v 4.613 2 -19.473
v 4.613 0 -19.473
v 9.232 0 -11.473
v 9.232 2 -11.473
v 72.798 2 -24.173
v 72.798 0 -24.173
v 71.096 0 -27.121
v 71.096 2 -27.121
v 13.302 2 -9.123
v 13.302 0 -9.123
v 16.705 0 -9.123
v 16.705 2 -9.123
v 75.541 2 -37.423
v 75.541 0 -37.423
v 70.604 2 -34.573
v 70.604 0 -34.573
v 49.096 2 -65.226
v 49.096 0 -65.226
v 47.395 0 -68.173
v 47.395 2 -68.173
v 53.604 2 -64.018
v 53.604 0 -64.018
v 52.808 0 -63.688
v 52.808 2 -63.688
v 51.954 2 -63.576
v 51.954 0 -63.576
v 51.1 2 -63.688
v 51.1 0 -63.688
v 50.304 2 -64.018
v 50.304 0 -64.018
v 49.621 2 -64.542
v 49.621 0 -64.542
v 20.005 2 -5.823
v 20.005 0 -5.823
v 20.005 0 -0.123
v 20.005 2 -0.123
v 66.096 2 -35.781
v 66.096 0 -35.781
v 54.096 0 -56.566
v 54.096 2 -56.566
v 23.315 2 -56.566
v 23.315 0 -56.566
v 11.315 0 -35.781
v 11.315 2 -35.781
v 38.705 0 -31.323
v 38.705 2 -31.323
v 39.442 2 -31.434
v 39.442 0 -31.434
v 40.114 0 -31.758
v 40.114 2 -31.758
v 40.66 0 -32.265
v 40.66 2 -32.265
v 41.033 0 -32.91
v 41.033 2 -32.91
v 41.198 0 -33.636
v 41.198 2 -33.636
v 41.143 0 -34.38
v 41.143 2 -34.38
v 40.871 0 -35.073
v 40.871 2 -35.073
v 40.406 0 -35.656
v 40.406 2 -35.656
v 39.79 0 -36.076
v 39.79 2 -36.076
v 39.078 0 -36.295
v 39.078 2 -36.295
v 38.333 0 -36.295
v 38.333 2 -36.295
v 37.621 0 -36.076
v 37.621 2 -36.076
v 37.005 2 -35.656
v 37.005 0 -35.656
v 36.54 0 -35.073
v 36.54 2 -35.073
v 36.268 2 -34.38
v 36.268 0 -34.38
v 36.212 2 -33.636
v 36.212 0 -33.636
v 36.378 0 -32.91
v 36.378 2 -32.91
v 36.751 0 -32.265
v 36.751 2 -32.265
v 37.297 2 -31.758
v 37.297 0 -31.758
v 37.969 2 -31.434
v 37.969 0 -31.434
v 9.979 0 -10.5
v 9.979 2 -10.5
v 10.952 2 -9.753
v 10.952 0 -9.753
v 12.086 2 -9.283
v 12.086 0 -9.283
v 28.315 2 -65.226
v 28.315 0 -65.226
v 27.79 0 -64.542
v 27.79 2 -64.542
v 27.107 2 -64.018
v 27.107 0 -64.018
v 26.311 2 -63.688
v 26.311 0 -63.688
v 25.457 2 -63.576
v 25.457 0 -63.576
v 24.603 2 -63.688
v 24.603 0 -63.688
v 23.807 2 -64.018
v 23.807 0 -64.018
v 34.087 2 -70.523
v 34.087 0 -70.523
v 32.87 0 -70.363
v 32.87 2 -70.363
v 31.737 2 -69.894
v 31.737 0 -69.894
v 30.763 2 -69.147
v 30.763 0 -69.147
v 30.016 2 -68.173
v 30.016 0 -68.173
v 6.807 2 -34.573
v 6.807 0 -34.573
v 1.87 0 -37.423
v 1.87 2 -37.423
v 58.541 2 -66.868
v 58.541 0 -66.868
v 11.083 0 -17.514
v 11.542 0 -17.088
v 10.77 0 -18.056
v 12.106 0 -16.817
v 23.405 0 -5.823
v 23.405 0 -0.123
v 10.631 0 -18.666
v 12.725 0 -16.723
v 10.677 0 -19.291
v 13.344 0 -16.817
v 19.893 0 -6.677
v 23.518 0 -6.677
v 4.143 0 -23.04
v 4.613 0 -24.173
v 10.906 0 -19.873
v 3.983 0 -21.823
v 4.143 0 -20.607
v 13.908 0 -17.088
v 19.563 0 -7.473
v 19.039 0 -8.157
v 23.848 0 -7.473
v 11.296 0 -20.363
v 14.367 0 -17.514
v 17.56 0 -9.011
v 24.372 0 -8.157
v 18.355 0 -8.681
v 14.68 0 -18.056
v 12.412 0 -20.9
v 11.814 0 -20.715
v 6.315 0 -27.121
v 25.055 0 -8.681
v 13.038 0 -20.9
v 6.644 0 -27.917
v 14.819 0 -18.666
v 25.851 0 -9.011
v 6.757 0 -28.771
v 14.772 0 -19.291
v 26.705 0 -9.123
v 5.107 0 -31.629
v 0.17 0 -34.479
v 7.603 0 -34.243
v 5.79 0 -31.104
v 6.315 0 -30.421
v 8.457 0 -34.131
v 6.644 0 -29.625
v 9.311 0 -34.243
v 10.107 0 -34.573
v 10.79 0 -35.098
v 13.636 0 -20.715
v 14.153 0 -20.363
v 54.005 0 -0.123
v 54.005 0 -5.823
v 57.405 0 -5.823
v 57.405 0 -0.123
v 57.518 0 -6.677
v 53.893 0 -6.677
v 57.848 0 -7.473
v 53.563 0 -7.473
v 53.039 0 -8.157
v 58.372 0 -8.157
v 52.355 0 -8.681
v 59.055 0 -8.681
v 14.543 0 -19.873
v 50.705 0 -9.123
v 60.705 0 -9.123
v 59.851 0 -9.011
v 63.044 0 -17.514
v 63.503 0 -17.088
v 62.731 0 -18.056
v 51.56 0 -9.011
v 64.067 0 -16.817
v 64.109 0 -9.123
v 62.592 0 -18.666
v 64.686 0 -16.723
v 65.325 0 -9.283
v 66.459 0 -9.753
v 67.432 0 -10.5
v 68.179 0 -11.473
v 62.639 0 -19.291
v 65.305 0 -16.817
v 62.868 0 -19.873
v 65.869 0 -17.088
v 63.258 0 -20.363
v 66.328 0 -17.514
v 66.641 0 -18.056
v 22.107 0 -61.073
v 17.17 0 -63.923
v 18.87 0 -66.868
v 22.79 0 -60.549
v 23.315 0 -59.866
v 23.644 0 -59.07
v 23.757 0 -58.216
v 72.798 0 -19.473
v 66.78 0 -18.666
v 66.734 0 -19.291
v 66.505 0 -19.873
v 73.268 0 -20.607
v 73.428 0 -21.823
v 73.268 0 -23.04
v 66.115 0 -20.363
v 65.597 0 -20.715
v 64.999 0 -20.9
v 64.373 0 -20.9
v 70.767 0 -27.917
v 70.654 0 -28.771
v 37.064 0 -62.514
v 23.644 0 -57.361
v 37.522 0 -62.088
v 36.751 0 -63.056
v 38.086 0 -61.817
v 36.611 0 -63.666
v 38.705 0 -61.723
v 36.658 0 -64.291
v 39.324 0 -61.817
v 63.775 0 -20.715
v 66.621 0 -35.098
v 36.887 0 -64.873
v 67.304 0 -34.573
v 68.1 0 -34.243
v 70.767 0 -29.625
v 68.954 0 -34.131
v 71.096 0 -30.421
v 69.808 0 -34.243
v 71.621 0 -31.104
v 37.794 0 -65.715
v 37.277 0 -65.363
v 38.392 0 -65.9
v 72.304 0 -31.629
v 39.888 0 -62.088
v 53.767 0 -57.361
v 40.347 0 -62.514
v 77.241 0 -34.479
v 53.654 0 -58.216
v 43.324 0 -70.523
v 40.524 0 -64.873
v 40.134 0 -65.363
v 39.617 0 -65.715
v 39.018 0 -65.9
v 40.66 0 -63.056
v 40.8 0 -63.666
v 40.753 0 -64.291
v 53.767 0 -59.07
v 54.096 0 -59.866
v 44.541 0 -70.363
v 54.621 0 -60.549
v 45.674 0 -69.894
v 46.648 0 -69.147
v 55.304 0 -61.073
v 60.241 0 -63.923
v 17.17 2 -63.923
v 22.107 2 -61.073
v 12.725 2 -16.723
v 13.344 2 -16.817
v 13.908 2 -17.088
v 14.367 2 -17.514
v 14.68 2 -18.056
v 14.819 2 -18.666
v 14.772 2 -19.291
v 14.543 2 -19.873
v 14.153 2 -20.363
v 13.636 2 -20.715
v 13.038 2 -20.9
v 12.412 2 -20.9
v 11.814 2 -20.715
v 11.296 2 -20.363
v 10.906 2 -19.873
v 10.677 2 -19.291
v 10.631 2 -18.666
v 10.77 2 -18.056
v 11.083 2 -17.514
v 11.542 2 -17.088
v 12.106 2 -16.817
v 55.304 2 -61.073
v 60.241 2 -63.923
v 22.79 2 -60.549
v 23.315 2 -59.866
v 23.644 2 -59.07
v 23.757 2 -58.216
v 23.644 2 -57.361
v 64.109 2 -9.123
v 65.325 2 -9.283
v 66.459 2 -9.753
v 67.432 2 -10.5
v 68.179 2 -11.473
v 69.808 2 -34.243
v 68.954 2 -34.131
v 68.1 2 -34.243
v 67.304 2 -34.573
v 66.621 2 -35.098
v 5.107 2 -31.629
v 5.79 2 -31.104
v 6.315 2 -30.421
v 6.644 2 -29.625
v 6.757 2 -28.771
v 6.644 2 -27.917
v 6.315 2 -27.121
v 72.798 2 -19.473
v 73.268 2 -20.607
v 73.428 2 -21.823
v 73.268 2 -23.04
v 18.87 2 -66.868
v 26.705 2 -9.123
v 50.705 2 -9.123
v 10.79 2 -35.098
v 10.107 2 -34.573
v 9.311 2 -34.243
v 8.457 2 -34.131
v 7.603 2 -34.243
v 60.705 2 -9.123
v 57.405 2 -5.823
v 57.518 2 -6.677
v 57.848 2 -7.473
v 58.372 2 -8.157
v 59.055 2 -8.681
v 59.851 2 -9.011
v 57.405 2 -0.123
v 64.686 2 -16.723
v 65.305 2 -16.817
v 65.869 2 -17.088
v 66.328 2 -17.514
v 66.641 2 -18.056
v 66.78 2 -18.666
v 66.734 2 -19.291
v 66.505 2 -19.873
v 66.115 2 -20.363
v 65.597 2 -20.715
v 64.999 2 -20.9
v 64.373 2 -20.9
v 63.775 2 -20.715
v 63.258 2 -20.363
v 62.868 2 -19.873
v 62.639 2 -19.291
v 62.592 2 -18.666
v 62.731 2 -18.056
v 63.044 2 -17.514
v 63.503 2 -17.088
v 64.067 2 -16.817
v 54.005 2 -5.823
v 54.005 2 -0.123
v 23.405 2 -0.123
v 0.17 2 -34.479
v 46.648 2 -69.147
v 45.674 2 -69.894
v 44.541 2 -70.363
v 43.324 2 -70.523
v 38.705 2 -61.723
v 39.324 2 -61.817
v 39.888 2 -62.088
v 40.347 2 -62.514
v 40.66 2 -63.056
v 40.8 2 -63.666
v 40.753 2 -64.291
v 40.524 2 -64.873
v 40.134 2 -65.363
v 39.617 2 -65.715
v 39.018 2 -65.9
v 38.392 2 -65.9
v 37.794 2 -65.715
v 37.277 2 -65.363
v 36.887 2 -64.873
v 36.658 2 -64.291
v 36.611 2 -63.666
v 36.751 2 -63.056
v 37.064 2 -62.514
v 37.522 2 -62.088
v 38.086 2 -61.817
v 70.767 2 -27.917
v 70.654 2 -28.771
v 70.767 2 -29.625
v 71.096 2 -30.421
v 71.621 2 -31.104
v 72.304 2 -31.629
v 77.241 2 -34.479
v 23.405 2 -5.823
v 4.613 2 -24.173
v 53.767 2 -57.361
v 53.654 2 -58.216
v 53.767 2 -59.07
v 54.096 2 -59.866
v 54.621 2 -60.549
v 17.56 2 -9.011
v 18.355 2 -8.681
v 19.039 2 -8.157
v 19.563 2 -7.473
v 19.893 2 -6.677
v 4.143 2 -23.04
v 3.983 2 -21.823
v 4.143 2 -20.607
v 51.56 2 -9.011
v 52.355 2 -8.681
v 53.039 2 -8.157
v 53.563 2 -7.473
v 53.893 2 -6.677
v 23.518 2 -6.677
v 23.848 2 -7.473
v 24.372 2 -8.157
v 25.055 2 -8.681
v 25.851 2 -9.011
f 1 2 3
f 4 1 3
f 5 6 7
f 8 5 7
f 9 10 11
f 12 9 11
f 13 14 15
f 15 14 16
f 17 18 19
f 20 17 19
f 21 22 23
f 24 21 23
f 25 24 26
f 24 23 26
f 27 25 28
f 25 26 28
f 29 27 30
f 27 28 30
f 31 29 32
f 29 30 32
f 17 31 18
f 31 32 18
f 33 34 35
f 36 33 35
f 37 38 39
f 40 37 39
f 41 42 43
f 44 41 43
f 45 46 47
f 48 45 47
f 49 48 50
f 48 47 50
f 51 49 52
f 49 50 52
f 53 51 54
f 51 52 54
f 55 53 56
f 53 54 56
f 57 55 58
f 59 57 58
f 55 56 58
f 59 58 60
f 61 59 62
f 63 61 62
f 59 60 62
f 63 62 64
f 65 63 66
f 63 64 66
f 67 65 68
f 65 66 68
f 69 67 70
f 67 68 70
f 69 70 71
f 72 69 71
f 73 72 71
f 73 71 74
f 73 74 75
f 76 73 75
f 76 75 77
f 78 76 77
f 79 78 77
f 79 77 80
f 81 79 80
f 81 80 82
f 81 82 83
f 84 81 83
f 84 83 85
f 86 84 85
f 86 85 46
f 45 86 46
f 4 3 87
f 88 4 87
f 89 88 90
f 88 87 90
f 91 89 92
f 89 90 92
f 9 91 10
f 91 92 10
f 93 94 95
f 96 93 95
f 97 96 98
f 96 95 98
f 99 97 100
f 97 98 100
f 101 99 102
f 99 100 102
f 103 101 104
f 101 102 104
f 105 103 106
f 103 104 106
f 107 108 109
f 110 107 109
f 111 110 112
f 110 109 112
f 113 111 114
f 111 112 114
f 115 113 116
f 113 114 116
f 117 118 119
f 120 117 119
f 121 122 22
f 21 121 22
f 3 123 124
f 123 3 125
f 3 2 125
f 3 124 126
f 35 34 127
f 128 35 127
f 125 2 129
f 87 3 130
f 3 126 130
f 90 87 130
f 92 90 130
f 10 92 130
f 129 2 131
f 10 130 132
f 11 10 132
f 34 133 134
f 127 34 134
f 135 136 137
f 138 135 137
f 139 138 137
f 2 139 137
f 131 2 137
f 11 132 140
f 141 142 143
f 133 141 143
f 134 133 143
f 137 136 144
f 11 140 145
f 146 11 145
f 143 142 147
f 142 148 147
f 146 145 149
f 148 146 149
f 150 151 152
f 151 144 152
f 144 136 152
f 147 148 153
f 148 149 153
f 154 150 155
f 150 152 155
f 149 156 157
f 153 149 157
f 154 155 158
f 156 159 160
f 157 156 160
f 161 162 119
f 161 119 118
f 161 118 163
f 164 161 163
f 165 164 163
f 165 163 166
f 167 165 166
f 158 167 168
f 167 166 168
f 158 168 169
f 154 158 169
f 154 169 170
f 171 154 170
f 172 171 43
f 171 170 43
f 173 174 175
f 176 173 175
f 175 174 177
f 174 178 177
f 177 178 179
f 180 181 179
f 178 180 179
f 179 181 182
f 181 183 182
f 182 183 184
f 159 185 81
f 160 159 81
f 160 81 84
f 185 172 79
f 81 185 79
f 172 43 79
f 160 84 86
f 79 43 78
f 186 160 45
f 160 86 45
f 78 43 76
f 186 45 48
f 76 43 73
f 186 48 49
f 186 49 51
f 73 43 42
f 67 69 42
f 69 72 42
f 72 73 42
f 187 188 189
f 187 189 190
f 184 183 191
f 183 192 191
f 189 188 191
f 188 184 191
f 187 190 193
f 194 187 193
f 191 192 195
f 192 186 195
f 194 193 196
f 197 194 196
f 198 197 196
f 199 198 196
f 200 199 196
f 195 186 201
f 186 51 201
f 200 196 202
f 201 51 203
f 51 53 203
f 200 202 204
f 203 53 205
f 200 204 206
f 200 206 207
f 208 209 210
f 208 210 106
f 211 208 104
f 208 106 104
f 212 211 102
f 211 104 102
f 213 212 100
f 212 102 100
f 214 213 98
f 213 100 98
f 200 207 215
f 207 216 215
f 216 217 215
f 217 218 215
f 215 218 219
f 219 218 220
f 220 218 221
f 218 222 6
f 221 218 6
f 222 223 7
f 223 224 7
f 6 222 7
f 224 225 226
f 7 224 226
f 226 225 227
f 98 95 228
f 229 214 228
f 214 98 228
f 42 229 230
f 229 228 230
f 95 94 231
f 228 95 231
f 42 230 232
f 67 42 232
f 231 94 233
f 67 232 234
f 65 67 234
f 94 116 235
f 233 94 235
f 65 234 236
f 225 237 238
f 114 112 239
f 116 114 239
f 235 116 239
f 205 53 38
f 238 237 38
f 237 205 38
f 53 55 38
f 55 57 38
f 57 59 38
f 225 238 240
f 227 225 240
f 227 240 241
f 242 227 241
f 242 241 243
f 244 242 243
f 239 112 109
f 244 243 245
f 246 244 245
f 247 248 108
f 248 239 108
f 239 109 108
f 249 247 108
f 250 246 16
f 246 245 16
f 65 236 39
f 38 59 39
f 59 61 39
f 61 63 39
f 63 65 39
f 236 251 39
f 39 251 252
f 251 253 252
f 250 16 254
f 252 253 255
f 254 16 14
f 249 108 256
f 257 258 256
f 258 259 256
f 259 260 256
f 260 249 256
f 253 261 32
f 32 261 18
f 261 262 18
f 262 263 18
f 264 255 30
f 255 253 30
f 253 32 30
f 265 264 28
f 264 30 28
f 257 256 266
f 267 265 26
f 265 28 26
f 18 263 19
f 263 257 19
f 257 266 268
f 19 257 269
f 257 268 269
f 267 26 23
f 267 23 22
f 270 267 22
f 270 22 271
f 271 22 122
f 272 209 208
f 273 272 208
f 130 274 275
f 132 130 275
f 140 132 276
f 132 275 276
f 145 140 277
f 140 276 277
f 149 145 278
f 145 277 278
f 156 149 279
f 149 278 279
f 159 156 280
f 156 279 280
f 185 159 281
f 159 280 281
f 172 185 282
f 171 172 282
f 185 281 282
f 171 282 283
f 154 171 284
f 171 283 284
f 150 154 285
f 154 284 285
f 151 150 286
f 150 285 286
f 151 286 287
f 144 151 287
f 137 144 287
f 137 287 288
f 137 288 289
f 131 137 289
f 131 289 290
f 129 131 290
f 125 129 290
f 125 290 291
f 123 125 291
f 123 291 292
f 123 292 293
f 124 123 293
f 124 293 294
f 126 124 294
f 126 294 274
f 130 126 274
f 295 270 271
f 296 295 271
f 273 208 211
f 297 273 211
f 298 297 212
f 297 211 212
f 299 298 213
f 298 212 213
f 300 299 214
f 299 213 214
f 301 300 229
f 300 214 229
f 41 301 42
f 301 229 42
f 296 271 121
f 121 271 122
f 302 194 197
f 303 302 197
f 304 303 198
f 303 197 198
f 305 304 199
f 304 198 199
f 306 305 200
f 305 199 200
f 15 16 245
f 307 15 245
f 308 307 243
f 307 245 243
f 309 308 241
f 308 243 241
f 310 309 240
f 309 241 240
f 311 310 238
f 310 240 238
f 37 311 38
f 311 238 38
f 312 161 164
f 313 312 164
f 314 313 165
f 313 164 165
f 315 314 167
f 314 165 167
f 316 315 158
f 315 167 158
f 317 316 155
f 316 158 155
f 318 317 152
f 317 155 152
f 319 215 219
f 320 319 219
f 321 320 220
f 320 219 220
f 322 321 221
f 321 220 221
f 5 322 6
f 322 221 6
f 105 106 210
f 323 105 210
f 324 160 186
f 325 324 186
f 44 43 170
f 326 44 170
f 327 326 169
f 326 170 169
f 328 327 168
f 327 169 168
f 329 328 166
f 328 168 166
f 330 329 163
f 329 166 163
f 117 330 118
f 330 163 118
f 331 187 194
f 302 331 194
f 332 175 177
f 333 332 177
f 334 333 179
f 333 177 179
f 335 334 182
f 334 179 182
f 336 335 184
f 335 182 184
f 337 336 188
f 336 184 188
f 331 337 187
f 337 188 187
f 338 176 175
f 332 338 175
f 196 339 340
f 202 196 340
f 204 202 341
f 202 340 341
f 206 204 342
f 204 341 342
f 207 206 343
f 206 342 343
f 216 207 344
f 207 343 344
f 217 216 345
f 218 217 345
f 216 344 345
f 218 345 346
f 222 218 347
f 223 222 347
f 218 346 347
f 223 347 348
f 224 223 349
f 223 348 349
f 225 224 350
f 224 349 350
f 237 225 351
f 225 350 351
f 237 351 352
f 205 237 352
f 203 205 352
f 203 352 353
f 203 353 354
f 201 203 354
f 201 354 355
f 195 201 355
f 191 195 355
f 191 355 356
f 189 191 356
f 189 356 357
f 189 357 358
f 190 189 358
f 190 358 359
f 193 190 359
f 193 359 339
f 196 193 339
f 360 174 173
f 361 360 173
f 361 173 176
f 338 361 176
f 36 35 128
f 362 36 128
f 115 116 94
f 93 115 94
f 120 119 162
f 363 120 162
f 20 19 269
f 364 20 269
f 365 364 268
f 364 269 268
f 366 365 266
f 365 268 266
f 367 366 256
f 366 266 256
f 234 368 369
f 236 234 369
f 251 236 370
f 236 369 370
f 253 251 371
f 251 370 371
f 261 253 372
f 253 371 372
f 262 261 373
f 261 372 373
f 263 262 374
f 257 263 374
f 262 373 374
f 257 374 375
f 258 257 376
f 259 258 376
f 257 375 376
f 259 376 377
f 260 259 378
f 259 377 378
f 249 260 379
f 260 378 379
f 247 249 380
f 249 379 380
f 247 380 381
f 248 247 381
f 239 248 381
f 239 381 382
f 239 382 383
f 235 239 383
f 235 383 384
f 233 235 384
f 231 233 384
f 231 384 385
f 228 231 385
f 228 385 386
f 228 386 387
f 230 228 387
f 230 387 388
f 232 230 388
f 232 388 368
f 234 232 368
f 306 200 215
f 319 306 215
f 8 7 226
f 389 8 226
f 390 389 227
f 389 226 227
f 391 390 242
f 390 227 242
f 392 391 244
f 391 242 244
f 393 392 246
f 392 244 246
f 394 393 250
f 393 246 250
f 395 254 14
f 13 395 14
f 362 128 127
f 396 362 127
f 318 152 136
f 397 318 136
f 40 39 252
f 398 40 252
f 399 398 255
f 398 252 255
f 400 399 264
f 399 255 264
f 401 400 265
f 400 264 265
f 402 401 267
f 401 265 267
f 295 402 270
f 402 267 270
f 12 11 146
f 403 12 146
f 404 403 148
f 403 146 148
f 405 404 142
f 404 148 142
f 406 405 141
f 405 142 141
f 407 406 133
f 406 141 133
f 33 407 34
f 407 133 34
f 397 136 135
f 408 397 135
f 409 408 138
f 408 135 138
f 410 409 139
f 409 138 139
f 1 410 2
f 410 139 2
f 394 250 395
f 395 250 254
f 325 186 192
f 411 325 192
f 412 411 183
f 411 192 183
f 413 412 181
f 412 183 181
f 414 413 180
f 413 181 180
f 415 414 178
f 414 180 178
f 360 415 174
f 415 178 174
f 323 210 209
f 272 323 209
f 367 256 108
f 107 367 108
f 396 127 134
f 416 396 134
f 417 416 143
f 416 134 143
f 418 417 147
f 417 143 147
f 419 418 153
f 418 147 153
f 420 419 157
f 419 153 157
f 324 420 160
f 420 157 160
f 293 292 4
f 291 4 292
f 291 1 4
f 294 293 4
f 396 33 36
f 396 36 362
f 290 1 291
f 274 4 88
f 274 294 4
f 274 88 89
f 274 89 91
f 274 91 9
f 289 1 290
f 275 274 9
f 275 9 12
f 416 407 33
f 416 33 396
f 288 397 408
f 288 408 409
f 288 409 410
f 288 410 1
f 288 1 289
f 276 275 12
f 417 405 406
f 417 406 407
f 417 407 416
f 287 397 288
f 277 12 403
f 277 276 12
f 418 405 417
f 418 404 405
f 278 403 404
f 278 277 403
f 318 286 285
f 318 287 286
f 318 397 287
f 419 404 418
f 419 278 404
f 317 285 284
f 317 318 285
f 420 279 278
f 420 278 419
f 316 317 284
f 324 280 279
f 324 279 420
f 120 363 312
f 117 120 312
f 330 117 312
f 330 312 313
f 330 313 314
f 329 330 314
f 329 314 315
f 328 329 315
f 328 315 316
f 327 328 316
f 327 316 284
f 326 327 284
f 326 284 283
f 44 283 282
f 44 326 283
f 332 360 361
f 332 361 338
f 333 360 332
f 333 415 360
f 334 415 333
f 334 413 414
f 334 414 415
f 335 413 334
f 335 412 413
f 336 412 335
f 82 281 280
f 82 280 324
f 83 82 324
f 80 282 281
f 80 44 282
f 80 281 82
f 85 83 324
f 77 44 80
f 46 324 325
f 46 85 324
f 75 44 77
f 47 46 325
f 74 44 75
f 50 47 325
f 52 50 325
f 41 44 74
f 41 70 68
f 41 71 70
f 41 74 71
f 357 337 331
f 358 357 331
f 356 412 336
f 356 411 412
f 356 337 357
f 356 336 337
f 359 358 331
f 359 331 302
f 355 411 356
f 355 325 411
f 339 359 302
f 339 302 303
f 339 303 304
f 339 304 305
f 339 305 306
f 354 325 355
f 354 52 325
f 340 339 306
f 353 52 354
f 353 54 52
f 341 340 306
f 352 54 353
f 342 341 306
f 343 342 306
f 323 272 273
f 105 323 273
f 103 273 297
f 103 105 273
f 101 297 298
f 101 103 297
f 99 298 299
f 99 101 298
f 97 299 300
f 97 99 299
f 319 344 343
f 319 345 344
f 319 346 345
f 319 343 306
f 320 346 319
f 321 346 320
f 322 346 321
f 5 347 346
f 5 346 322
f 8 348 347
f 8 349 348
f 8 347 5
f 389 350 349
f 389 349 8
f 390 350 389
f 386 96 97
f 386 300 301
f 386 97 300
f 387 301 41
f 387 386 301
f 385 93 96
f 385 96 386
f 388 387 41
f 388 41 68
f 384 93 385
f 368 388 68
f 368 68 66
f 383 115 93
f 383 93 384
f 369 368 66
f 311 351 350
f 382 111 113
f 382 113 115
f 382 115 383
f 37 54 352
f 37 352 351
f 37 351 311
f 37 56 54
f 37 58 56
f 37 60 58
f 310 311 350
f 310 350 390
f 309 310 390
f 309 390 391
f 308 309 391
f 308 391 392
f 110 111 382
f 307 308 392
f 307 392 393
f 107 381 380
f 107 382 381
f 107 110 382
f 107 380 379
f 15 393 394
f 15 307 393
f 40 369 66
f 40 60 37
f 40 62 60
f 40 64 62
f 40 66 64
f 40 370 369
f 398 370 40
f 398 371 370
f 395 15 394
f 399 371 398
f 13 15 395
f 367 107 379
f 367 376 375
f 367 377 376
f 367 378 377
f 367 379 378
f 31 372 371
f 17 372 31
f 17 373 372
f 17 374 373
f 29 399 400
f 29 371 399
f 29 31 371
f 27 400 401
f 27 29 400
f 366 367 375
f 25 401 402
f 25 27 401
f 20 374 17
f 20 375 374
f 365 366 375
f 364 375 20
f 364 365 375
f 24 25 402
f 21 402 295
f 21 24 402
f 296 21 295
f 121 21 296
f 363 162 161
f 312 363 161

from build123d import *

# Parameters (mm, degrees)
BOSS_EXTRUDE1_DEPTH = 2
SKETCH4_R           = 2.1
CUT_EXTRUDE1_DEPTH  = 105.611811864
SKETCH5_R           = 2.5
CUT_EXTRUDE2_DEPTH  = 105.611811864


with BuildPart() as part:
    # Sketch1 → Boss-Extrude1 (new body)
    with BuildSketch(Plane(origin=(0, 0, 0), x_dir=(1, 0, 0), z_dir=(0, 1, 0))):
        with BuildLine():
            Line((49.096295698, 65.225835767), (47.394589776, 68.173276884))
            ThreePointArc((47.394589776, 68.173276884), (45.674270378, 69.893596282), (43.324270378, 70.523276884))
            Line((43.324270378, 70.523276884), (34.086666071, 70.523276884))
            ThreePointArc((34.086666071, 70.523276884), (31.736666071, 69.893596282), (30.016346673, 68.173276884))
            Line((30.016346673, 68.173276884), (28.314640751, 65.225835767))
            ThreePointArc((28.314640751, 65.225835767), (26.310859767, 63.688280541), (23.806756919, 64.017951935))
            Line((23.806756919, 64.017951935), (18.870412117, 66.867951935))
            Line((18.870412117, 66.867951935), (17.170412117, 63.923465562))
            Line((17.170412117, 63.923465562), (22.106756919, 61.073465562))
            ThreePointArc((22.106756919, 61.073465562), (23.644312145, 59.069684578), (23.314640751, 56.565581729))
            Line((23.314640751, 56.565581729), (11.314640751, 35.780972039))
            ThreePointArc((11.314640751, 35.780972039), (9.310859767, 34.243416812), (6.806756919, 34.573088206))
            Line((6.806756919, 34.573088206), (1.870412117, 37.423088206))
            Line((1.870412117, 37.423088206), (0.170412117, 34.478601833))
            Line((0.170412117, 34.478601833), (5.106756919, 31.628601833))
            ThreePointArc((5.106756919, 31.628601833), (6.644312145, 29.62482085), (6.314640751, 27.120718001))
            Line((6.314640751, 27.120718001), (4.612934829, 24.173276884))
            ThreePointArc((4.612934829, 24.173276884), (3.983254227, 21.823276884), (4.612934829, 19.473276884))
            Line((4.612934829, 19.473276884), (9.231736982, 11.473276884))
            ThreePointArc((9.231736982, 11.473276884), (10.95205638, 9.752957486), (13.30205638, 9.123276884))
            Line((13.30205638, 9.123276884), (16.705468225, 9.123276884))
            ThreePointArc((16.705468225, 9.123276884), (19.038920602, 8.156729262), (20.005468225, 5.823276884))
            Line((20.005468225, 5.823276884), (20.005468225, 0.123276884))
            Line((20.005468225, 0.123276884), (23.405468225, 0.123276884))
            Line((23.405468225, 0.123276884), (23.405468225, 5.823276884))
            ThreePointArc((23.405468225, 5.823276884), (24.372015847, 8.156729262), (26.705468225, 9.123276884))
            Line((26.705468225, 9.123276884), (50.705468225, 9.123276884))
            ThreePointArc((50.705468225, 9.123276884), (53.038920602, 8.156729262), (54.005468225, 5.823276884))
            Line((54.005468225, 5.823276884), (54.005468225, 0.123276884))
            Line((54.005468225, 0.123276884), (57.405468225, 0.123276884))
            Line((57.405468225, 0.123276884), (57.405468225, 5.823276884))
            ThreePointArc((57.405468225, 5.823276884), (58.372015847, 8.156729262), (60.705468225, 9.123276884))
            Line((60.705468225, 9.123276884), (64.108880069, 9.123276884))
            ThreePointArc((64.108880069, 9.123276884), (66.458880069, 9.752957486), (68.179199467, 11.473276884))
            Line((68.179199467, 11.473276884), (72.79800162, 19.473276884))
            ThreePointArc((72.79800162, 19.473276884), (73.427682222, 21.823276884), (72.79800162, 24.173276884))
            Line((72.79800162, 24.173276884), (71.096295698, 27.120718001))
            ThreePointArc((71.096295698, 27.120718001), (70.766624304, 29.62482085), (72.304179531, 31.628601833))
            Line((72.304179531, 31.628601833), (77.240524332, 34.478601833))
            Line((77.240524332, 34.478601833), (75.540524332, 37.423088206))
            Line((75.540524332, 37.423088206), (70.604179531, 34.573088206))
            ThreePointArc((70.604179531, 34.573088206), (68.100076682, 34.243416812), (66.096295698, 35.780972039))
            Line((66.096295698, 35.780972039), (54.096295698, 56.565581729))
            ThreePointArc((54.096295698, 56.565581729), (53.766624304, 59.069684578), (55.304179531, 61.073465562))
            Line((55.304179531, 61.073465562), (60.240524332, 63.923465562))
            Line((60.240524332, 63.923465562), (58.540524332, 66.867951935))
            Line((58.540524332, 66.867951935), (53.604179531, 64.017951935))
            ThreePointArc((53.604179531, 64.017951935), (51.100076682, 63.688280541), (49.096295698, 65.225835767))
        make_face()
    extrude(amount=BOSS_EXTRUDE1_DEPTH)

    # Sketch4 → Cut-Extrude1 (cut, through all)
    with BuildSketch(Plane(origin=(0, 2, 0), x_dir=(1, 0, 0), z_dir=(0, 1, 0))):
        with Locations(Location((38.705468225, 63.823276884, 0), (0, 0, 270))):
            Circle(SKETCH4_R)
        with Locations(Location((12.724706111, 18.823276884, 0), (0, 0, 270))):
            Circle(SKETCH4_R)
        with Locations(Location((64.686230338, 18.823276884, 0), (0, 0, 270))):
            Circle(SKETCH4_R)
    extrude(amount=-CUT_EXTRUDE1_DEPTH, mode=Mode.SUBTRACT)

    # Sketch5 → Cut-Extrude2 (cut, through all)
    with BuildSketch(Plane(origin=(0, 2, 0), x_dir=(1, 0, 0), z_dir=(0, 1, 0))):
        with Locations(Location((38.705468225, 33.823276884, 0), (0, 0, 270))):
            Circle(SKETCH5_R)
    extrude(amount=-CUT_EXTRUDE2_DEPTH, mode=Mode.SUBTRACT)


solid = part.part
